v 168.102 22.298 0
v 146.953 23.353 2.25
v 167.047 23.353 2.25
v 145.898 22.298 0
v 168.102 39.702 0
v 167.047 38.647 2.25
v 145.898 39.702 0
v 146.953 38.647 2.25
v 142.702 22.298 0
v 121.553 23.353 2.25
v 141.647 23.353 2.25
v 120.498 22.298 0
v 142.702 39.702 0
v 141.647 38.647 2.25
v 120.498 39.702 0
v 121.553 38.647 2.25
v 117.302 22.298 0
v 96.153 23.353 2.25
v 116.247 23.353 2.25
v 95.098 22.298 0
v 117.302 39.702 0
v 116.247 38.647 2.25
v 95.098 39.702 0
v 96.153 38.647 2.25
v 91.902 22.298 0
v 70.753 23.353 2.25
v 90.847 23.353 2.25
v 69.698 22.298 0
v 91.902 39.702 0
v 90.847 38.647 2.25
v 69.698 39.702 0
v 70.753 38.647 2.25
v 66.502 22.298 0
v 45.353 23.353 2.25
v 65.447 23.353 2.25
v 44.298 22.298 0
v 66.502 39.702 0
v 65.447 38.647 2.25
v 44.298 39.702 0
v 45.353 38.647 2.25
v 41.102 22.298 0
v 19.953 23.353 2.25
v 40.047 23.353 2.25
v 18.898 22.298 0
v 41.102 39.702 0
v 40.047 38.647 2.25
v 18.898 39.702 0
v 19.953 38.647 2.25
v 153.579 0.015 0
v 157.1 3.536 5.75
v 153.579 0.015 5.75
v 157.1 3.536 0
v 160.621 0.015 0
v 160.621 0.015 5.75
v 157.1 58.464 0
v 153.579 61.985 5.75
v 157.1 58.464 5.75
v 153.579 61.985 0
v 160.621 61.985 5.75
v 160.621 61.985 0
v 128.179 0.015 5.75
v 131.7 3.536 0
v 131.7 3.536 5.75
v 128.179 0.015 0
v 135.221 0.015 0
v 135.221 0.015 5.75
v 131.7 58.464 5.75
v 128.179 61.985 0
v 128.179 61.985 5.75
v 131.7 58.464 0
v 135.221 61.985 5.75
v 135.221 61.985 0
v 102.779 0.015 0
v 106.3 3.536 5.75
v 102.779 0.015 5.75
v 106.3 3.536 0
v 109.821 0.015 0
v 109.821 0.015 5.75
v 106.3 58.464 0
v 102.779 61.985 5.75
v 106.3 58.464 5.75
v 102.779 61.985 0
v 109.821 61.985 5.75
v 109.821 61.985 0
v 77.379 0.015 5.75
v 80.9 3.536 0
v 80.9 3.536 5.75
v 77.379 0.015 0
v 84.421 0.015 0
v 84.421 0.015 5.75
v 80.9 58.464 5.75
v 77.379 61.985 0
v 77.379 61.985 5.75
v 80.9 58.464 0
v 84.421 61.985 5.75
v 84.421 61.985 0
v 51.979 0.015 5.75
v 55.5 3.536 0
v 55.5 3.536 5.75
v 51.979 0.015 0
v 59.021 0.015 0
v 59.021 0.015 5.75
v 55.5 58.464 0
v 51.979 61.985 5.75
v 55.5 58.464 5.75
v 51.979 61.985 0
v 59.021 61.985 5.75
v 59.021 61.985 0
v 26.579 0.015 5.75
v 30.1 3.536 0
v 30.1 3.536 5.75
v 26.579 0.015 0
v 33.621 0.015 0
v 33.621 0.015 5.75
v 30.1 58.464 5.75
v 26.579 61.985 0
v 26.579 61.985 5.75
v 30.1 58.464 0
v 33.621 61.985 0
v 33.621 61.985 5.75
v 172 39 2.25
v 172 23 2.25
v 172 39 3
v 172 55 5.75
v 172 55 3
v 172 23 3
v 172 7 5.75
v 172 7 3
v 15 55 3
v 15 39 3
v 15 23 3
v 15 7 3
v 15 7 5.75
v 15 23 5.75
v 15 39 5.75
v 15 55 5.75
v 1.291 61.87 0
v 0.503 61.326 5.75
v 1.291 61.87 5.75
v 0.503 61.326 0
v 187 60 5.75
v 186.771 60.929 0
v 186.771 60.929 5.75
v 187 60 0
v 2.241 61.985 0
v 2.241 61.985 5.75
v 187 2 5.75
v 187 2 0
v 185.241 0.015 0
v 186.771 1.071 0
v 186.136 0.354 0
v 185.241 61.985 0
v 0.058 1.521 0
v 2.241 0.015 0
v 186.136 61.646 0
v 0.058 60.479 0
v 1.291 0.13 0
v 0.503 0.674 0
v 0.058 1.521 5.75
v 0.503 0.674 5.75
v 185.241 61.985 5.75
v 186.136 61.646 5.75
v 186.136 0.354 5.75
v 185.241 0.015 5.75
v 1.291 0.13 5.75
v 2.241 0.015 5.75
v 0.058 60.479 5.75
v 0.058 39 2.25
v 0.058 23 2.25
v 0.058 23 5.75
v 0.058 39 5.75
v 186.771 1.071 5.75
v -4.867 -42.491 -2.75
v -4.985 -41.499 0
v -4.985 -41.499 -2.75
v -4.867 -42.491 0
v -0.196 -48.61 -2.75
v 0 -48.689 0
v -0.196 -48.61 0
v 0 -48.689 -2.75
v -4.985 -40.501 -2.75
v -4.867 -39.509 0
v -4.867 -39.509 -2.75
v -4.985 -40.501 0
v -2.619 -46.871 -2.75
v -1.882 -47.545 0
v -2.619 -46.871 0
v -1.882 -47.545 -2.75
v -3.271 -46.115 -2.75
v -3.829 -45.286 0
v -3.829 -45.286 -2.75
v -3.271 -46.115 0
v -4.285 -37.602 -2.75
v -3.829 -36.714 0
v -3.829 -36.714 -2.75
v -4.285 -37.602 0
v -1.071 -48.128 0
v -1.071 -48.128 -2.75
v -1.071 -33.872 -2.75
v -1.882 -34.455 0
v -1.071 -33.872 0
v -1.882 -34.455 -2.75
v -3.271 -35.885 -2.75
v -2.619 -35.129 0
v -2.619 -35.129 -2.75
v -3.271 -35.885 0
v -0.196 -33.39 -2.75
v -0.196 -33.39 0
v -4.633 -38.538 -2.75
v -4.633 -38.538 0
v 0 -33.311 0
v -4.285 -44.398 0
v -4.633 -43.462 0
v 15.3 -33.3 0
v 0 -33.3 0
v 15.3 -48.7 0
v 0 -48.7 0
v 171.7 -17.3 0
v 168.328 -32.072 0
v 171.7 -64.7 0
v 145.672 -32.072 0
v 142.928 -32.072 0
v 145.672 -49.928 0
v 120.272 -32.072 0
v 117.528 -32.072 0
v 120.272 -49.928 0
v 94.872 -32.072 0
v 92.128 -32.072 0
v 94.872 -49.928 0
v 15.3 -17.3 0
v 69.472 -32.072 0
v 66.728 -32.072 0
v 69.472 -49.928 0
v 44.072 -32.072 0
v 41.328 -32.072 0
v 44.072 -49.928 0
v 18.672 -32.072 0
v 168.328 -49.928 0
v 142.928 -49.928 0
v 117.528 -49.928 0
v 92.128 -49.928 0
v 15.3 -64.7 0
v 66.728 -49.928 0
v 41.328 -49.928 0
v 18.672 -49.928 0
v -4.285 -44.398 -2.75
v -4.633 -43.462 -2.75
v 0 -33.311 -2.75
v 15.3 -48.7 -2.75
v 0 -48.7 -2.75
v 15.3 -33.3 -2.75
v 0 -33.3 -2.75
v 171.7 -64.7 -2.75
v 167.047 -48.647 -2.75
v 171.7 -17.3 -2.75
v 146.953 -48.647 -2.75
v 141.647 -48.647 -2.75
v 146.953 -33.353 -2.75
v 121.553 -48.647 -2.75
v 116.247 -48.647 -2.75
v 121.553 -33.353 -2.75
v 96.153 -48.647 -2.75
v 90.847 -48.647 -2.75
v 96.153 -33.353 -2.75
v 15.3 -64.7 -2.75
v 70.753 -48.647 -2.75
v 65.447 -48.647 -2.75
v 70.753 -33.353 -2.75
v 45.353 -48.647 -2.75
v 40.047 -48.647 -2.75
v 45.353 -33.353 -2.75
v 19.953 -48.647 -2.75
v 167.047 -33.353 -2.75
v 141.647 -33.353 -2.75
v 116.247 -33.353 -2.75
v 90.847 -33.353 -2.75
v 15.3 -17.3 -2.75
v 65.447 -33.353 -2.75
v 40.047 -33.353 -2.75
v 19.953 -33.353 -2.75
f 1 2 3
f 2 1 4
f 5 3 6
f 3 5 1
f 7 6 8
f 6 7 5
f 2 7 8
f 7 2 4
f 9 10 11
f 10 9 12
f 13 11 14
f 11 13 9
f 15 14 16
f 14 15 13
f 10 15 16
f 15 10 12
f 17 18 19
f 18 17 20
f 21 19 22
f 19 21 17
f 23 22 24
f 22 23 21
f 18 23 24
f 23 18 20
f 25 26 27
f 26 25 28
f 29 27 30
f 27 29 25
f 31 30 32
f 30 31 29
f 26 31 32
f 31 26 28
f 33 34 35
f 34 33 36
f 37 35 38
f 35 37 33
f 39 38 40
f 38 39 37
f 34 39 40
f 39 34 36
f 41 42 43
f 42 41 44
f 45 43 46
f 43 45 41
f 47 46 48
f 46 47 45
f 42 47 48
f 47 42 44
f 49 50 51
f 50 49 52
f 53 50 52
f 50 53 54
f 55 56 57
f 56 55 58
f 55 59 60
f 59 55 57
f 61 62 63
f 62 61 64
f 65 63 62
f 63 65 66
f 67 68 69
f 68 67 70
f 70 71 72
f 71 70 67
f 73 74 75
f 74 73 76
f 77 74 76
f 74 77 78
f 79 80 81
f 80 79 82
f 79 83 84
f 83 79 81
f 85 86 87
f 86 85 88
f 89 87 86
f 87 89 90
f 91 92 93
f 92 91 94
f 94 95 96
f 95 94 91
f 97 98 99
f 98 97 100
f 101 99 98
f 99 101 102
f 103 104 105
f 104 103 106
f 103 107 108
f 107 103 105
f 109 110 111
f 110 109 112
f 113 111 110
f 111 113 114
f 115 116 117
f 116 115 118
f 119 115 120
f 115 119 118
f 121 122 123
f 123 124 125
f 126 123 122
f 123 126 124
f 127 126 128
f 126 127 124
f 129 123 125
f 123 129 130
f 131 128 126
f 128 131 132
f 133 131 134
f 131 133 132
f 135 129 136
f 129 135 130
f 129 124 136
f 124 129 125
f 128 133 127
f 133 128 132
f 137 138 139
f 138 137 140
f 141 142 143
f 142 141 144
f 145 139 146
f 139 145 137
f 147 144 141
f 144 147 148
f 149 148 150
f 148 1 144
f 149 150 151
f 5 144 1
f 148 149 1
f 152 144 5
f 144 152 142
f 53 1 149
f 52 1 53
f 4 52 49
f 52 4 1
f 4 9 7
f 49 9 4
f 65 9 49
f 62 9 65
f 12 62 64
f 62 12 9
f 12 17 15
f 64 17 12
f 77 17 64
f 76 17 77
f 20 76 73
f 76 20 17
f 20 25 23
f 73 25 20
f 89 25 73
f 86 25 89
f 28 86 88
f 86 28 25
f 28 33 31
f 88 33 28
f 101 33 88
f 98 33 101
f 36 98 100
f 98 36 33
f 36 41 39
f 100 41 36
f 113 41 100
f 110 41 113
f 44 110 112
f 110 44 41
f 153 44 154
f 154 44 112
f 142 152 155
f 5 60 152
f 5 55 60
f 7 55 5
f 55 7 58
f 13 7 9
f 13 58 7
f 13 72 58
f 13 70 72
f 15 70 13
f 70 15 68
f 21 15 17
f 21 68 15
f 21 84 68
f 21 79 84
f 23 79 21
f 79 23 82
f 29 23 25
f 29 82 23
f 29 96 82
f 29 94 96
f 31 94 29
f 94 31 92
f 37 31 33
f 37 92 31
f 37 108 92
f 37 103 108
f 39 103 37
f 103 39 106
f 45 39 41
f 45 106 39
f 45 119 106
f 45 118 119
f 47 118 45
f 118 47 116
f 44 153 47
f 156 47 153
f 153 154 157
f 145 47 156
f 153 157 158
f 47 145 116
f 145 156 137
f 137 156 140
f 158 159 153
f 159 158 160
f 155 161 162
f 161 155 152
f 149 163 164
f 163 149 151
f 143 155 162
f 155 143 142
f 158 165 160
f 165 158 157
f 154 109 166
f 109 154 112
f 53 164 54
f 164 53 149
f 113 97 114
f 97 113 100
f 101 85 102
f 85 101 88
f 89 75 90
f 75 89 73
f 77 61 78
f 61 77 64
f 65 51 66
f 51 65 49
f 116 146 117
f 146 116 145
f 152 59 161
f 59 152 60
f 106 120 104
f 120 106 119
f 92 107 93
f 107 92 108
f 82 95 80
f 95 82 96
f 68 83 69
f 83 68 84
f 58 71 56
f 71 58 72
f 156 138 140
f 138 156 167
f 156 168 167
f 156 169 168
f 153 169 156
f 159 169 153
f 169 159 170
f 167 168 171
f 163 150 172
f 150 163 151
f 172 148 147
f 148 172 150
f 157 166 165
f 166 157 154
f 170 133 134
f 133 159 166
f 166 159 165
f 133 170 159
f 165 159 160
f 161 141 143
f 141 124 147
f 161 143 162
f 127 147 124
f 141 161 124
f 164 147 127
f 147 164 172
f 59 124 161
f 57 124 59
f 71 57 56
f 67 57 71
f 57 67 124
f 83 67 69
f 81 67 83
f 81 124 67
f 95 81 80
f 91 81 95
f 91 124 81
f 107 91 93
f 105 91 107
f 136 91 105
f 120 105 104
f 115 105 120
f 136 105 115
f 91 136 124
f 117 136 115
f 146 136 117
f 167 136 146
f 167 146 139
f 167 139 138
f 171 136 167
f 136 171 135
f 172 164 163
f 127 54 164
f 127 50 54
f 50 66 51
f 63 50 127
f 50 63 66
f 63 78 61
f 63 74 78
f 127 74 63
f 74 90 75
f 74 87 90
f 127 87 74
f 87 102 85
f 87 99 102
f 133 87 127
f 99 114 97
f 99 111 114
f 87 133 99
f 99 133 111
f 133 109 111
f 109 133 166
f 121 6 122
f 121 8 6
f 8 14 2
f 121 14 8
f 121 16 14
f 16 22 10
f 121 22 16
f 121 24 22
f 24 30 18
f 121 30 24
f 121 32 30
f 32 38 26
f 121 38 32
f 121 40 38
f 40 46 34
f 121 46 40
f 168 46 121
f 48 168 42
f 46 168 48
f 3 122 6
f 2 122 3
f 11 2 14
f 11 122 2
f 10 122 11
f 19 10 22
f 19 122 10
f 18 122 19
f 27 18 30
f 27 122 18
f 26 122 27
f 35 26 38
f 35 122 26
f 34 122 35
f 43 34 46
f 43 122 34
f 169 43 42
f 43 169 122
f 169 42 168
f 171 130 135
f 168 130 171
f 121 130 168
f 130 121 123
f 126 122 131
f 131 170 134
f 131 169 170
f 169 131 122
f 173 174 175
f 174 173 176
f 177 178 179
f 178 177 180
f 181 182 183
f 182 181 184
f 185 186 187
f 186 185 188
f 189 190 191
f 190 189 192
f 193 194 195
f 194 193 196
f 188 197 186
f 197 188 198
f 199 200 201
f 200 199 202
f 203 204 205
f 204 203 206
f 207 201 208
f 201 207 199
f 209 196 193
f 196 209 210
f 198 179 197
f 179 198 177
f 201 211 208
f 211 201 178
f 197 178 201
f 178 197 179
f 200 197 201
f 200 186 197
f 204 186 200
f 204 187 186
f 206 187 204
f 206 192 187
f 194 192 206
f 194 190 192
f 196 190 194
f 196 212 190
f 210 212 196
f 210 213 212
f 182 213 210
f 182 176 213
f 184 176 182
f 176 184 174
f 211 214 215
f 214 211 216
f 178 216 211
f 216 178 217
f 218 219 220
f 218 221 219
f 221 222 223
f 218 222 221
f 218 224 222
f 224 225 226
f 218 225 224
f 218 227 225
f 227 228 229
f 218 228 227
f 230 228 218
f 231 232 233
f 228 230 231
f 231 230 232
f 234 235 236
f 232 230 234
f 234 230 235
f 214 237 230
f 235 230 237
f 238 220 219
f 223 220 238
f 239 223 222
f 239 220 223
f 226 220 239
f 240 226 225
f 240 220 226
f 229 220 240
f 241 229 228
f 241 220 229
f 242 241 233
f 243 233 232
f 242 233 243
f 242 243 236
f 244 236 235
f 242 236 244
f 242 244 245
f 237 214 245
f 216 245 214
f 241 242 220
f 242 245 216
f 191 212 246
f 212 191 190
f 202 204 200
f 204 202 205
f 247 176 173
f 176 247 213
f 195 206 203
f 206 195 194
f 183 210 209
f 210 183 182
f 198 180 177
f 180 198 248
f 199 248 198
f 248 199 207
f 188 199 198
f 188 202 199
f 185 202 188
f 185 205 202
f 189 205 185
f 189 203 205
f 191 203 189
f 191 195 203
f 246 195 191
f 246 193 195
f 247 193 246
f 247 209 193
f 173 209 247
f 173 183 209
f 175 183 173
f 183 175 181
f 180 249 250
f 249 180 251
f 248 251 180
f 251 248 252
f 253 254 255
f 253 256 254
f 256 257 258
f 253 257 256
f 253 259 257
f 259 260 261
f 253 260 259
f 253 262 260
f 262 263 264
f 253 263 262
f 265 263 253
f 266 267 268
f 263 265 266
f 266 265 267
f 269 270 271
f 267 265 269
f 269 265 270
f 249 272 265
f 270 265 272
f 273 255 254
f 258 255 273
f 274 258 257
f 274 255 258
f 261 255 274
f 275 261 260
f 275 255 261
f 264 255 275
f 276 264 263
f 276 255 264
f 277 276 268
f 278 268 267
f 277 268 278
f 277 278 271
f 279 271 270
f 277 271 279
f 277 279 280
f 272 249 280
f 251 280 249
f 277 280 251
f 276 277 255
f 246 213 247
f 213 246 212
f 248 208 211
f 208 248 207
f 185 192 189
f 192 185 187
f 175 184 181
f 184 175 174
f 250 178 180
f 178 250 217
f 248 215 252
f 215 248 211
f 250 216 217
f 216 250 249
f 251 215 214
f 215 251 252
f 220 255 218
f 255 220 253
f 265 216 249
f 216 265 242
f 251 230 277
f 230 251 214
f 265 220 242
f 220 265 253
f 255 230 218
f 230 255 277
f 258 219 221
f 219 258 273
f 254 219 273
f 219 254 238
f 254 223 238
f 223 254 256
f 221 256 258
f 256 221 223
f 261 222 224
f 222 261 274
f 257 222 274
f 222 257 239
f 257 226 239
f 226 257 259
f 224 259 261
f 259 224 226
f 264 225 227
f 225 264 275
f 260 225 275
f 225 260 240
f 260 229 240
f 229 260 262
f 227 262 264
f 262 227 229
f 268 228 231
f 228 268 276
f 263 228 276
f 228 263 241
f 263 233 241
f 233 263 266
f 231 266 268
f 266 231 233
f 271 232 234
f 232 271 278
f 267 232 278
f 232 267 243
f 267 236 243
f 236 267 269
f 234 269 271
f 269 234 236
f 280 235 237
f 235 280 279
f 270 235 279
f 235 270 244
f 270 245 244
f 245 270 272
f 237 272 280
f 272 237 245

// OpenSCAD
// -*- mode: SCAD ; c-file-style: "ellemtel" ; coding: utf-8 -*-
//
// Film holder to scan 110 (pocket) film in a Reflecta ProScan 10T 35 mm
// film scanner
//
// © 2018 Roland Sieker <ospalh@gmail.com>
// Licence: CC-BY-NC-SA 4.0
// Based on …
/*
 * Film Holder for Plustek OpticFilm scanners and 110 films.
 *
 * (C) 2016 Richard "Shred" Körber
 *
 * Project page on Thingiverse:
 *   https://www.thingiverse.com/thing:1328672
 *
 * Licensed under Creative Commons BY-NC-SA:
 *   https://creativecommons.org/licenses/by-nc-sa/3.0/
 */

// … to preview. You will get all parts when you click “Create Thing”.
part = "cover"; // [holder: film strip holder, cover: film strip cover]


// Also depends on your printer size!
numberOfWindows = 6;    // [1:20]

// Use struts to save some material?
saveMaterial = "false"; // [false:No, true:Yes]


// trick the customizer into ignoring the following variables...
module endOfParameters() {}



height = 5.75;  // Total height (Z)
innerHeight = 3;  // Height of inner frame (Z)
minkRadius = 2;  // Minkowski radius for outer frame

totalWidth = 62;  // Total width (Y)
filmWidth = 16;  // Film width (Y)
filmThickness = 0.75;  // Film thickness (Z)

windowLength = 20;  // Length of a single window (X)
windowOffset = 5;  // Offset of first window to right frame edge (X)
windowDistance = 25.4;  // Distance between windows (X)
windowGap = 0.4;  // Gap size on each side (Y)

notchSize = 5;  // Length (X) of transport notches (depth is half of it)
notchHeight = height;  // Height (Z) of notches

coverFrameSizeX = 15;  // Distance outer edge to cover edge (X)
coverFrameSizeY = 7;  // Distance outer edge to cover edge (Y)
coverGap = 0.3;  // Gap between outer and inner edges

strutsThickness = 4;  // Thickness of the save material struts

cutHeight = height + 2;
windowCount = numberOfWindows;
windowWidth = filmWidth - 2 * windowGap;
filmLength = windowCount * windowDistance - (windowDistance - windowLength) +
   2 * windowOffset;
totalLength = filmLength + 2 * coverFrameSizeX;
coverHeight = height - innerHeight;

// Set this to “render” and click on “Create Thing” when done with the setup.
preview = 1; // [0:render, 1:preview]

tau = 2 * PI;  // π is still wrong. τ = ⌀ ÷ r
angle=60;
xy_factor = 1/tan(angle);
// To get from a height to a horizontal width inclined correctly
z_factor = tan(angle);  // The other way around


some_distance = 10;
ms = 0.01;  // Muggeseggele.

// fn for differently sized objects and fs, fa; all for preview or rendering.
pna = 40;
pnb = 15;
pa = 5;
ps = 1;
rna = 180;
rnb = 30;
ra = 1;
rs = 0.1;
function na() = (preview) ? pna : rna;
function nb() = (preview) ? pnb : rnb;
$fs = (preview) ? ps : rs;
$fa = (preview) ? pa : ra;


// *******************************************************
// End setup



// *******************************************************
// Generate the parts

// print_part();
preview_parts();
// stack_parts();



module print_part()
{
   if ("holder" == part)
   {
      completeHolder();
   }
   if ("cover" == part)
   {
      completeCover();
   }
}

module preview_parts()
{

   completeHolder();
   translate([0, -some_distance, 0])
   {
      completeCover();
   }
}

module stack_parts()
{
   // intersection()
   {
      color("yellow")
      {
         completeHolder();
      }
      color("red")
      {
         translate([0, 0, innerHeight+ms])
         {
            rotate([180, 0, 0])
            {
               // Derotated
               completeCover();
            }
         }
      }
   }
}

// *******************************************************
// Code for the parts themselves




// uncomment to find out if the top cover fits into the holder
//






// Holder Base
module holder()
{
   translate([minkRadius, minkRadius, 0])
   {
      minkowski()
      {
         cube(
            [totalLength - minkRadius * 2, totalWidth- minkRadius * 2,
             height - 1]);
         cylinder(r=minkRadius, h=1);
      }
   }
}

// Cover Cutout
module coverCutout()
{
   translate([0, coverFrameSizeY, innerHeight])
   {
      cube([filmLength, totalWidth - coverFrameSizeY * 2, cutHeight]);
   }
}

// Triangles (for the struts)
module triangle(dim)
{
   polyhedron(
      points = [
         [0, 0, 0],
         [dim[0], 0, 0],
         [dim[0], dim[1], 0],
         [0, 0, dim[2]],
         [dim[0], 0, dim[2]],
         [dim[0], dim[1], dim[2]]
         ],
      faces = [
         [0, 1, 2], [3, 5, 4],
         [0, 3, 4, 1], [1, 4, 5, 2], [0, 2, 5, 3]

         ]
      );
}

// Circlular segment
module circlePart(dim)
{
   r = (4 * pow(dim[0], 2) + pow(dim[1], 2)) / (8 * dim[0]);
   translate([r - dim[0], dim[1] / 2, dim[2] / 2])
   {
      difference()
      {
         cylinder(h=dim[2], r=r, center=true);
         translate([dim[0], 0, -0.2])
         {
            cube([r*2, r*2, dim[2] + 0.5], center=true);
         }
      }
   }
}

// Draws a single scan window
module window(wHeight)
{
   chh = wHeight / 2;
   ihh = wHeight + 0.2;
   polyhedron(
      points = [
         [-chh, -chh, 0],
         [windowLength + chh, -chh, 0],
         [windowLength + chh, windowWidth + chh, 0],
         [-chh, windowWidth + chh, 0],
         [0, 0, ihh],
         [windowLength, 0, ihh],
         [windowLength, windowWidth, ihh],
         [0, windowWidth, ihh]
         ],
      faces = [
         [0, 4, 5, 1], [1, 5, 6, 2], [2, 6, 7, 3],
         [3, 7, 4, 0], [0, 1, 2, 3], [4, 7, 6, 5]
         ]
      );
}

// Draws all the windows
module windows(wHeight)
{
   for (i = [filmLength - windowLength - windowOffset : -windowDistance : 0])
   {
      translate([i, 0, -0.1])
      {
         window(wHeight);
      }
   }
}

// Draws a single notch
module notch()
{
   rotate([0, 0, 45]) translate([0, 0, (notchHeight / 2) - 0.1])
   {
      cube([notchSize, notchSize, notchHeight + 0.3], center=true);
   }
}

// Draws all the notches
module notches()
{
   for (i = [filmLength - windowLength - windowOffset : -windowDistance : 0])
   {
      translate([i + (windowWidth + windowOffset) / 2, 0, 0]) notch();
      translate([i + (windowWidth + windowOffset) / 2, totalWidth, 0]) notch();
   }
}

// Draws a cutout pattern to save material
module cutoutPattern(dim)
{
   tw = dim[0] / 4;
   to = strutsThickness / 2;
   for (j = [0 : tw : dim[0] - 1])
   {
      translate([j + to, 0, 0])
      {
         triangle([tw - to * 1.5, dim[1] - to, dim[2]]);
      }
      translate([j + tw - to, dim[1], 0])
      {
         rotate([0, 0, 180])
         {
            triangle([tw - to * 1.5, dim[1] - to, dim[2]]);
         }
      }
   }
}

// If saving material, draws a cutout pattern above and below the windows
module saveMaterialCutout(length, border=0)
{
   if (saveMaterial == "true")
   {
      smHeight = (totalWidth - coverFrameSizeY * 2 - filmWidth) / 2 -
         strutsThickness;

      translate([0, totalWidth - coverFrameSizeY - smHeight, -0.1])
      {
         cutoutPattern([length, smHeight - border, cutHeight]);
      }
      translate([0, coverFrameSizeY + border, -0.1])
      {
         cutoutPattern([length, smHeight - border, cutHeight]);
      }
   }
}

// Draws the cover plate (without cutouts)
module coverPlate()
{
   union()
   {
      translate([(totalLength - filmLength) / 2 + coverGap, 0, 0])
      {
         cube(
            [filmLength - coverGap * 2,
             totalWidth - coverFrameSizeY * 2 - coverGap * 2,
             coverHeight]);
      }

      translate(
         [0, (totalWidth - filmWidth - coverFrameSizeY * 2) / 2, 0])
      {
         cube(
            [coverFrameSizeX + coverGap * 4, filmWidth - coverGap * 2,
             coverHeight]);
         circlePart([5, filmWidth - coverGap * 2, coverHeight]);
      }
   }

}

// Draws the entire holder bottom
module completeHolder()
{
   difference()
   {
      holder();
      translate(
         [-0.1, (totalWidth - filmWidth) / 2, innerHeight - filmThickness])
      {
         cube([filmLength + coverFrameSizeX + 0.1, filmWidth, height]);
      }

      translate(
         [(totalLength - filmLength) / 2,
          (totalWidth - filmWidth) / 2 + windowGap, -filmThickness])
      {
         windows(innerHeight);
      }

      translate([(totalLength - filmLength) / 2, 0, 0])
      {
         coverCutout();
         notches();
         saveMaterialCutout(filmLength);
      }
   }
}

// Draws the entire holder top cover
module completeCover()
{
   rotate([180,0,0])
   {
      difference()
      {
         translate([0, coverFrameSizeY + coverGap, 0])
         {
            coverPlate();
         }

         translate(
            [(totalLength - filmLength) / 2,
             (totalWidth - filmWidth) / 2 + windowGap, 0])
         {
            windows(coverHeight);
         }

         translate([(totalLength - filmLength) / 2 + strutsThickness, 0, 0])
         {
            saveMaterialCutout(filmLength - strutsThickness * 2, strutsThickness);
         }
      }
   }
}
